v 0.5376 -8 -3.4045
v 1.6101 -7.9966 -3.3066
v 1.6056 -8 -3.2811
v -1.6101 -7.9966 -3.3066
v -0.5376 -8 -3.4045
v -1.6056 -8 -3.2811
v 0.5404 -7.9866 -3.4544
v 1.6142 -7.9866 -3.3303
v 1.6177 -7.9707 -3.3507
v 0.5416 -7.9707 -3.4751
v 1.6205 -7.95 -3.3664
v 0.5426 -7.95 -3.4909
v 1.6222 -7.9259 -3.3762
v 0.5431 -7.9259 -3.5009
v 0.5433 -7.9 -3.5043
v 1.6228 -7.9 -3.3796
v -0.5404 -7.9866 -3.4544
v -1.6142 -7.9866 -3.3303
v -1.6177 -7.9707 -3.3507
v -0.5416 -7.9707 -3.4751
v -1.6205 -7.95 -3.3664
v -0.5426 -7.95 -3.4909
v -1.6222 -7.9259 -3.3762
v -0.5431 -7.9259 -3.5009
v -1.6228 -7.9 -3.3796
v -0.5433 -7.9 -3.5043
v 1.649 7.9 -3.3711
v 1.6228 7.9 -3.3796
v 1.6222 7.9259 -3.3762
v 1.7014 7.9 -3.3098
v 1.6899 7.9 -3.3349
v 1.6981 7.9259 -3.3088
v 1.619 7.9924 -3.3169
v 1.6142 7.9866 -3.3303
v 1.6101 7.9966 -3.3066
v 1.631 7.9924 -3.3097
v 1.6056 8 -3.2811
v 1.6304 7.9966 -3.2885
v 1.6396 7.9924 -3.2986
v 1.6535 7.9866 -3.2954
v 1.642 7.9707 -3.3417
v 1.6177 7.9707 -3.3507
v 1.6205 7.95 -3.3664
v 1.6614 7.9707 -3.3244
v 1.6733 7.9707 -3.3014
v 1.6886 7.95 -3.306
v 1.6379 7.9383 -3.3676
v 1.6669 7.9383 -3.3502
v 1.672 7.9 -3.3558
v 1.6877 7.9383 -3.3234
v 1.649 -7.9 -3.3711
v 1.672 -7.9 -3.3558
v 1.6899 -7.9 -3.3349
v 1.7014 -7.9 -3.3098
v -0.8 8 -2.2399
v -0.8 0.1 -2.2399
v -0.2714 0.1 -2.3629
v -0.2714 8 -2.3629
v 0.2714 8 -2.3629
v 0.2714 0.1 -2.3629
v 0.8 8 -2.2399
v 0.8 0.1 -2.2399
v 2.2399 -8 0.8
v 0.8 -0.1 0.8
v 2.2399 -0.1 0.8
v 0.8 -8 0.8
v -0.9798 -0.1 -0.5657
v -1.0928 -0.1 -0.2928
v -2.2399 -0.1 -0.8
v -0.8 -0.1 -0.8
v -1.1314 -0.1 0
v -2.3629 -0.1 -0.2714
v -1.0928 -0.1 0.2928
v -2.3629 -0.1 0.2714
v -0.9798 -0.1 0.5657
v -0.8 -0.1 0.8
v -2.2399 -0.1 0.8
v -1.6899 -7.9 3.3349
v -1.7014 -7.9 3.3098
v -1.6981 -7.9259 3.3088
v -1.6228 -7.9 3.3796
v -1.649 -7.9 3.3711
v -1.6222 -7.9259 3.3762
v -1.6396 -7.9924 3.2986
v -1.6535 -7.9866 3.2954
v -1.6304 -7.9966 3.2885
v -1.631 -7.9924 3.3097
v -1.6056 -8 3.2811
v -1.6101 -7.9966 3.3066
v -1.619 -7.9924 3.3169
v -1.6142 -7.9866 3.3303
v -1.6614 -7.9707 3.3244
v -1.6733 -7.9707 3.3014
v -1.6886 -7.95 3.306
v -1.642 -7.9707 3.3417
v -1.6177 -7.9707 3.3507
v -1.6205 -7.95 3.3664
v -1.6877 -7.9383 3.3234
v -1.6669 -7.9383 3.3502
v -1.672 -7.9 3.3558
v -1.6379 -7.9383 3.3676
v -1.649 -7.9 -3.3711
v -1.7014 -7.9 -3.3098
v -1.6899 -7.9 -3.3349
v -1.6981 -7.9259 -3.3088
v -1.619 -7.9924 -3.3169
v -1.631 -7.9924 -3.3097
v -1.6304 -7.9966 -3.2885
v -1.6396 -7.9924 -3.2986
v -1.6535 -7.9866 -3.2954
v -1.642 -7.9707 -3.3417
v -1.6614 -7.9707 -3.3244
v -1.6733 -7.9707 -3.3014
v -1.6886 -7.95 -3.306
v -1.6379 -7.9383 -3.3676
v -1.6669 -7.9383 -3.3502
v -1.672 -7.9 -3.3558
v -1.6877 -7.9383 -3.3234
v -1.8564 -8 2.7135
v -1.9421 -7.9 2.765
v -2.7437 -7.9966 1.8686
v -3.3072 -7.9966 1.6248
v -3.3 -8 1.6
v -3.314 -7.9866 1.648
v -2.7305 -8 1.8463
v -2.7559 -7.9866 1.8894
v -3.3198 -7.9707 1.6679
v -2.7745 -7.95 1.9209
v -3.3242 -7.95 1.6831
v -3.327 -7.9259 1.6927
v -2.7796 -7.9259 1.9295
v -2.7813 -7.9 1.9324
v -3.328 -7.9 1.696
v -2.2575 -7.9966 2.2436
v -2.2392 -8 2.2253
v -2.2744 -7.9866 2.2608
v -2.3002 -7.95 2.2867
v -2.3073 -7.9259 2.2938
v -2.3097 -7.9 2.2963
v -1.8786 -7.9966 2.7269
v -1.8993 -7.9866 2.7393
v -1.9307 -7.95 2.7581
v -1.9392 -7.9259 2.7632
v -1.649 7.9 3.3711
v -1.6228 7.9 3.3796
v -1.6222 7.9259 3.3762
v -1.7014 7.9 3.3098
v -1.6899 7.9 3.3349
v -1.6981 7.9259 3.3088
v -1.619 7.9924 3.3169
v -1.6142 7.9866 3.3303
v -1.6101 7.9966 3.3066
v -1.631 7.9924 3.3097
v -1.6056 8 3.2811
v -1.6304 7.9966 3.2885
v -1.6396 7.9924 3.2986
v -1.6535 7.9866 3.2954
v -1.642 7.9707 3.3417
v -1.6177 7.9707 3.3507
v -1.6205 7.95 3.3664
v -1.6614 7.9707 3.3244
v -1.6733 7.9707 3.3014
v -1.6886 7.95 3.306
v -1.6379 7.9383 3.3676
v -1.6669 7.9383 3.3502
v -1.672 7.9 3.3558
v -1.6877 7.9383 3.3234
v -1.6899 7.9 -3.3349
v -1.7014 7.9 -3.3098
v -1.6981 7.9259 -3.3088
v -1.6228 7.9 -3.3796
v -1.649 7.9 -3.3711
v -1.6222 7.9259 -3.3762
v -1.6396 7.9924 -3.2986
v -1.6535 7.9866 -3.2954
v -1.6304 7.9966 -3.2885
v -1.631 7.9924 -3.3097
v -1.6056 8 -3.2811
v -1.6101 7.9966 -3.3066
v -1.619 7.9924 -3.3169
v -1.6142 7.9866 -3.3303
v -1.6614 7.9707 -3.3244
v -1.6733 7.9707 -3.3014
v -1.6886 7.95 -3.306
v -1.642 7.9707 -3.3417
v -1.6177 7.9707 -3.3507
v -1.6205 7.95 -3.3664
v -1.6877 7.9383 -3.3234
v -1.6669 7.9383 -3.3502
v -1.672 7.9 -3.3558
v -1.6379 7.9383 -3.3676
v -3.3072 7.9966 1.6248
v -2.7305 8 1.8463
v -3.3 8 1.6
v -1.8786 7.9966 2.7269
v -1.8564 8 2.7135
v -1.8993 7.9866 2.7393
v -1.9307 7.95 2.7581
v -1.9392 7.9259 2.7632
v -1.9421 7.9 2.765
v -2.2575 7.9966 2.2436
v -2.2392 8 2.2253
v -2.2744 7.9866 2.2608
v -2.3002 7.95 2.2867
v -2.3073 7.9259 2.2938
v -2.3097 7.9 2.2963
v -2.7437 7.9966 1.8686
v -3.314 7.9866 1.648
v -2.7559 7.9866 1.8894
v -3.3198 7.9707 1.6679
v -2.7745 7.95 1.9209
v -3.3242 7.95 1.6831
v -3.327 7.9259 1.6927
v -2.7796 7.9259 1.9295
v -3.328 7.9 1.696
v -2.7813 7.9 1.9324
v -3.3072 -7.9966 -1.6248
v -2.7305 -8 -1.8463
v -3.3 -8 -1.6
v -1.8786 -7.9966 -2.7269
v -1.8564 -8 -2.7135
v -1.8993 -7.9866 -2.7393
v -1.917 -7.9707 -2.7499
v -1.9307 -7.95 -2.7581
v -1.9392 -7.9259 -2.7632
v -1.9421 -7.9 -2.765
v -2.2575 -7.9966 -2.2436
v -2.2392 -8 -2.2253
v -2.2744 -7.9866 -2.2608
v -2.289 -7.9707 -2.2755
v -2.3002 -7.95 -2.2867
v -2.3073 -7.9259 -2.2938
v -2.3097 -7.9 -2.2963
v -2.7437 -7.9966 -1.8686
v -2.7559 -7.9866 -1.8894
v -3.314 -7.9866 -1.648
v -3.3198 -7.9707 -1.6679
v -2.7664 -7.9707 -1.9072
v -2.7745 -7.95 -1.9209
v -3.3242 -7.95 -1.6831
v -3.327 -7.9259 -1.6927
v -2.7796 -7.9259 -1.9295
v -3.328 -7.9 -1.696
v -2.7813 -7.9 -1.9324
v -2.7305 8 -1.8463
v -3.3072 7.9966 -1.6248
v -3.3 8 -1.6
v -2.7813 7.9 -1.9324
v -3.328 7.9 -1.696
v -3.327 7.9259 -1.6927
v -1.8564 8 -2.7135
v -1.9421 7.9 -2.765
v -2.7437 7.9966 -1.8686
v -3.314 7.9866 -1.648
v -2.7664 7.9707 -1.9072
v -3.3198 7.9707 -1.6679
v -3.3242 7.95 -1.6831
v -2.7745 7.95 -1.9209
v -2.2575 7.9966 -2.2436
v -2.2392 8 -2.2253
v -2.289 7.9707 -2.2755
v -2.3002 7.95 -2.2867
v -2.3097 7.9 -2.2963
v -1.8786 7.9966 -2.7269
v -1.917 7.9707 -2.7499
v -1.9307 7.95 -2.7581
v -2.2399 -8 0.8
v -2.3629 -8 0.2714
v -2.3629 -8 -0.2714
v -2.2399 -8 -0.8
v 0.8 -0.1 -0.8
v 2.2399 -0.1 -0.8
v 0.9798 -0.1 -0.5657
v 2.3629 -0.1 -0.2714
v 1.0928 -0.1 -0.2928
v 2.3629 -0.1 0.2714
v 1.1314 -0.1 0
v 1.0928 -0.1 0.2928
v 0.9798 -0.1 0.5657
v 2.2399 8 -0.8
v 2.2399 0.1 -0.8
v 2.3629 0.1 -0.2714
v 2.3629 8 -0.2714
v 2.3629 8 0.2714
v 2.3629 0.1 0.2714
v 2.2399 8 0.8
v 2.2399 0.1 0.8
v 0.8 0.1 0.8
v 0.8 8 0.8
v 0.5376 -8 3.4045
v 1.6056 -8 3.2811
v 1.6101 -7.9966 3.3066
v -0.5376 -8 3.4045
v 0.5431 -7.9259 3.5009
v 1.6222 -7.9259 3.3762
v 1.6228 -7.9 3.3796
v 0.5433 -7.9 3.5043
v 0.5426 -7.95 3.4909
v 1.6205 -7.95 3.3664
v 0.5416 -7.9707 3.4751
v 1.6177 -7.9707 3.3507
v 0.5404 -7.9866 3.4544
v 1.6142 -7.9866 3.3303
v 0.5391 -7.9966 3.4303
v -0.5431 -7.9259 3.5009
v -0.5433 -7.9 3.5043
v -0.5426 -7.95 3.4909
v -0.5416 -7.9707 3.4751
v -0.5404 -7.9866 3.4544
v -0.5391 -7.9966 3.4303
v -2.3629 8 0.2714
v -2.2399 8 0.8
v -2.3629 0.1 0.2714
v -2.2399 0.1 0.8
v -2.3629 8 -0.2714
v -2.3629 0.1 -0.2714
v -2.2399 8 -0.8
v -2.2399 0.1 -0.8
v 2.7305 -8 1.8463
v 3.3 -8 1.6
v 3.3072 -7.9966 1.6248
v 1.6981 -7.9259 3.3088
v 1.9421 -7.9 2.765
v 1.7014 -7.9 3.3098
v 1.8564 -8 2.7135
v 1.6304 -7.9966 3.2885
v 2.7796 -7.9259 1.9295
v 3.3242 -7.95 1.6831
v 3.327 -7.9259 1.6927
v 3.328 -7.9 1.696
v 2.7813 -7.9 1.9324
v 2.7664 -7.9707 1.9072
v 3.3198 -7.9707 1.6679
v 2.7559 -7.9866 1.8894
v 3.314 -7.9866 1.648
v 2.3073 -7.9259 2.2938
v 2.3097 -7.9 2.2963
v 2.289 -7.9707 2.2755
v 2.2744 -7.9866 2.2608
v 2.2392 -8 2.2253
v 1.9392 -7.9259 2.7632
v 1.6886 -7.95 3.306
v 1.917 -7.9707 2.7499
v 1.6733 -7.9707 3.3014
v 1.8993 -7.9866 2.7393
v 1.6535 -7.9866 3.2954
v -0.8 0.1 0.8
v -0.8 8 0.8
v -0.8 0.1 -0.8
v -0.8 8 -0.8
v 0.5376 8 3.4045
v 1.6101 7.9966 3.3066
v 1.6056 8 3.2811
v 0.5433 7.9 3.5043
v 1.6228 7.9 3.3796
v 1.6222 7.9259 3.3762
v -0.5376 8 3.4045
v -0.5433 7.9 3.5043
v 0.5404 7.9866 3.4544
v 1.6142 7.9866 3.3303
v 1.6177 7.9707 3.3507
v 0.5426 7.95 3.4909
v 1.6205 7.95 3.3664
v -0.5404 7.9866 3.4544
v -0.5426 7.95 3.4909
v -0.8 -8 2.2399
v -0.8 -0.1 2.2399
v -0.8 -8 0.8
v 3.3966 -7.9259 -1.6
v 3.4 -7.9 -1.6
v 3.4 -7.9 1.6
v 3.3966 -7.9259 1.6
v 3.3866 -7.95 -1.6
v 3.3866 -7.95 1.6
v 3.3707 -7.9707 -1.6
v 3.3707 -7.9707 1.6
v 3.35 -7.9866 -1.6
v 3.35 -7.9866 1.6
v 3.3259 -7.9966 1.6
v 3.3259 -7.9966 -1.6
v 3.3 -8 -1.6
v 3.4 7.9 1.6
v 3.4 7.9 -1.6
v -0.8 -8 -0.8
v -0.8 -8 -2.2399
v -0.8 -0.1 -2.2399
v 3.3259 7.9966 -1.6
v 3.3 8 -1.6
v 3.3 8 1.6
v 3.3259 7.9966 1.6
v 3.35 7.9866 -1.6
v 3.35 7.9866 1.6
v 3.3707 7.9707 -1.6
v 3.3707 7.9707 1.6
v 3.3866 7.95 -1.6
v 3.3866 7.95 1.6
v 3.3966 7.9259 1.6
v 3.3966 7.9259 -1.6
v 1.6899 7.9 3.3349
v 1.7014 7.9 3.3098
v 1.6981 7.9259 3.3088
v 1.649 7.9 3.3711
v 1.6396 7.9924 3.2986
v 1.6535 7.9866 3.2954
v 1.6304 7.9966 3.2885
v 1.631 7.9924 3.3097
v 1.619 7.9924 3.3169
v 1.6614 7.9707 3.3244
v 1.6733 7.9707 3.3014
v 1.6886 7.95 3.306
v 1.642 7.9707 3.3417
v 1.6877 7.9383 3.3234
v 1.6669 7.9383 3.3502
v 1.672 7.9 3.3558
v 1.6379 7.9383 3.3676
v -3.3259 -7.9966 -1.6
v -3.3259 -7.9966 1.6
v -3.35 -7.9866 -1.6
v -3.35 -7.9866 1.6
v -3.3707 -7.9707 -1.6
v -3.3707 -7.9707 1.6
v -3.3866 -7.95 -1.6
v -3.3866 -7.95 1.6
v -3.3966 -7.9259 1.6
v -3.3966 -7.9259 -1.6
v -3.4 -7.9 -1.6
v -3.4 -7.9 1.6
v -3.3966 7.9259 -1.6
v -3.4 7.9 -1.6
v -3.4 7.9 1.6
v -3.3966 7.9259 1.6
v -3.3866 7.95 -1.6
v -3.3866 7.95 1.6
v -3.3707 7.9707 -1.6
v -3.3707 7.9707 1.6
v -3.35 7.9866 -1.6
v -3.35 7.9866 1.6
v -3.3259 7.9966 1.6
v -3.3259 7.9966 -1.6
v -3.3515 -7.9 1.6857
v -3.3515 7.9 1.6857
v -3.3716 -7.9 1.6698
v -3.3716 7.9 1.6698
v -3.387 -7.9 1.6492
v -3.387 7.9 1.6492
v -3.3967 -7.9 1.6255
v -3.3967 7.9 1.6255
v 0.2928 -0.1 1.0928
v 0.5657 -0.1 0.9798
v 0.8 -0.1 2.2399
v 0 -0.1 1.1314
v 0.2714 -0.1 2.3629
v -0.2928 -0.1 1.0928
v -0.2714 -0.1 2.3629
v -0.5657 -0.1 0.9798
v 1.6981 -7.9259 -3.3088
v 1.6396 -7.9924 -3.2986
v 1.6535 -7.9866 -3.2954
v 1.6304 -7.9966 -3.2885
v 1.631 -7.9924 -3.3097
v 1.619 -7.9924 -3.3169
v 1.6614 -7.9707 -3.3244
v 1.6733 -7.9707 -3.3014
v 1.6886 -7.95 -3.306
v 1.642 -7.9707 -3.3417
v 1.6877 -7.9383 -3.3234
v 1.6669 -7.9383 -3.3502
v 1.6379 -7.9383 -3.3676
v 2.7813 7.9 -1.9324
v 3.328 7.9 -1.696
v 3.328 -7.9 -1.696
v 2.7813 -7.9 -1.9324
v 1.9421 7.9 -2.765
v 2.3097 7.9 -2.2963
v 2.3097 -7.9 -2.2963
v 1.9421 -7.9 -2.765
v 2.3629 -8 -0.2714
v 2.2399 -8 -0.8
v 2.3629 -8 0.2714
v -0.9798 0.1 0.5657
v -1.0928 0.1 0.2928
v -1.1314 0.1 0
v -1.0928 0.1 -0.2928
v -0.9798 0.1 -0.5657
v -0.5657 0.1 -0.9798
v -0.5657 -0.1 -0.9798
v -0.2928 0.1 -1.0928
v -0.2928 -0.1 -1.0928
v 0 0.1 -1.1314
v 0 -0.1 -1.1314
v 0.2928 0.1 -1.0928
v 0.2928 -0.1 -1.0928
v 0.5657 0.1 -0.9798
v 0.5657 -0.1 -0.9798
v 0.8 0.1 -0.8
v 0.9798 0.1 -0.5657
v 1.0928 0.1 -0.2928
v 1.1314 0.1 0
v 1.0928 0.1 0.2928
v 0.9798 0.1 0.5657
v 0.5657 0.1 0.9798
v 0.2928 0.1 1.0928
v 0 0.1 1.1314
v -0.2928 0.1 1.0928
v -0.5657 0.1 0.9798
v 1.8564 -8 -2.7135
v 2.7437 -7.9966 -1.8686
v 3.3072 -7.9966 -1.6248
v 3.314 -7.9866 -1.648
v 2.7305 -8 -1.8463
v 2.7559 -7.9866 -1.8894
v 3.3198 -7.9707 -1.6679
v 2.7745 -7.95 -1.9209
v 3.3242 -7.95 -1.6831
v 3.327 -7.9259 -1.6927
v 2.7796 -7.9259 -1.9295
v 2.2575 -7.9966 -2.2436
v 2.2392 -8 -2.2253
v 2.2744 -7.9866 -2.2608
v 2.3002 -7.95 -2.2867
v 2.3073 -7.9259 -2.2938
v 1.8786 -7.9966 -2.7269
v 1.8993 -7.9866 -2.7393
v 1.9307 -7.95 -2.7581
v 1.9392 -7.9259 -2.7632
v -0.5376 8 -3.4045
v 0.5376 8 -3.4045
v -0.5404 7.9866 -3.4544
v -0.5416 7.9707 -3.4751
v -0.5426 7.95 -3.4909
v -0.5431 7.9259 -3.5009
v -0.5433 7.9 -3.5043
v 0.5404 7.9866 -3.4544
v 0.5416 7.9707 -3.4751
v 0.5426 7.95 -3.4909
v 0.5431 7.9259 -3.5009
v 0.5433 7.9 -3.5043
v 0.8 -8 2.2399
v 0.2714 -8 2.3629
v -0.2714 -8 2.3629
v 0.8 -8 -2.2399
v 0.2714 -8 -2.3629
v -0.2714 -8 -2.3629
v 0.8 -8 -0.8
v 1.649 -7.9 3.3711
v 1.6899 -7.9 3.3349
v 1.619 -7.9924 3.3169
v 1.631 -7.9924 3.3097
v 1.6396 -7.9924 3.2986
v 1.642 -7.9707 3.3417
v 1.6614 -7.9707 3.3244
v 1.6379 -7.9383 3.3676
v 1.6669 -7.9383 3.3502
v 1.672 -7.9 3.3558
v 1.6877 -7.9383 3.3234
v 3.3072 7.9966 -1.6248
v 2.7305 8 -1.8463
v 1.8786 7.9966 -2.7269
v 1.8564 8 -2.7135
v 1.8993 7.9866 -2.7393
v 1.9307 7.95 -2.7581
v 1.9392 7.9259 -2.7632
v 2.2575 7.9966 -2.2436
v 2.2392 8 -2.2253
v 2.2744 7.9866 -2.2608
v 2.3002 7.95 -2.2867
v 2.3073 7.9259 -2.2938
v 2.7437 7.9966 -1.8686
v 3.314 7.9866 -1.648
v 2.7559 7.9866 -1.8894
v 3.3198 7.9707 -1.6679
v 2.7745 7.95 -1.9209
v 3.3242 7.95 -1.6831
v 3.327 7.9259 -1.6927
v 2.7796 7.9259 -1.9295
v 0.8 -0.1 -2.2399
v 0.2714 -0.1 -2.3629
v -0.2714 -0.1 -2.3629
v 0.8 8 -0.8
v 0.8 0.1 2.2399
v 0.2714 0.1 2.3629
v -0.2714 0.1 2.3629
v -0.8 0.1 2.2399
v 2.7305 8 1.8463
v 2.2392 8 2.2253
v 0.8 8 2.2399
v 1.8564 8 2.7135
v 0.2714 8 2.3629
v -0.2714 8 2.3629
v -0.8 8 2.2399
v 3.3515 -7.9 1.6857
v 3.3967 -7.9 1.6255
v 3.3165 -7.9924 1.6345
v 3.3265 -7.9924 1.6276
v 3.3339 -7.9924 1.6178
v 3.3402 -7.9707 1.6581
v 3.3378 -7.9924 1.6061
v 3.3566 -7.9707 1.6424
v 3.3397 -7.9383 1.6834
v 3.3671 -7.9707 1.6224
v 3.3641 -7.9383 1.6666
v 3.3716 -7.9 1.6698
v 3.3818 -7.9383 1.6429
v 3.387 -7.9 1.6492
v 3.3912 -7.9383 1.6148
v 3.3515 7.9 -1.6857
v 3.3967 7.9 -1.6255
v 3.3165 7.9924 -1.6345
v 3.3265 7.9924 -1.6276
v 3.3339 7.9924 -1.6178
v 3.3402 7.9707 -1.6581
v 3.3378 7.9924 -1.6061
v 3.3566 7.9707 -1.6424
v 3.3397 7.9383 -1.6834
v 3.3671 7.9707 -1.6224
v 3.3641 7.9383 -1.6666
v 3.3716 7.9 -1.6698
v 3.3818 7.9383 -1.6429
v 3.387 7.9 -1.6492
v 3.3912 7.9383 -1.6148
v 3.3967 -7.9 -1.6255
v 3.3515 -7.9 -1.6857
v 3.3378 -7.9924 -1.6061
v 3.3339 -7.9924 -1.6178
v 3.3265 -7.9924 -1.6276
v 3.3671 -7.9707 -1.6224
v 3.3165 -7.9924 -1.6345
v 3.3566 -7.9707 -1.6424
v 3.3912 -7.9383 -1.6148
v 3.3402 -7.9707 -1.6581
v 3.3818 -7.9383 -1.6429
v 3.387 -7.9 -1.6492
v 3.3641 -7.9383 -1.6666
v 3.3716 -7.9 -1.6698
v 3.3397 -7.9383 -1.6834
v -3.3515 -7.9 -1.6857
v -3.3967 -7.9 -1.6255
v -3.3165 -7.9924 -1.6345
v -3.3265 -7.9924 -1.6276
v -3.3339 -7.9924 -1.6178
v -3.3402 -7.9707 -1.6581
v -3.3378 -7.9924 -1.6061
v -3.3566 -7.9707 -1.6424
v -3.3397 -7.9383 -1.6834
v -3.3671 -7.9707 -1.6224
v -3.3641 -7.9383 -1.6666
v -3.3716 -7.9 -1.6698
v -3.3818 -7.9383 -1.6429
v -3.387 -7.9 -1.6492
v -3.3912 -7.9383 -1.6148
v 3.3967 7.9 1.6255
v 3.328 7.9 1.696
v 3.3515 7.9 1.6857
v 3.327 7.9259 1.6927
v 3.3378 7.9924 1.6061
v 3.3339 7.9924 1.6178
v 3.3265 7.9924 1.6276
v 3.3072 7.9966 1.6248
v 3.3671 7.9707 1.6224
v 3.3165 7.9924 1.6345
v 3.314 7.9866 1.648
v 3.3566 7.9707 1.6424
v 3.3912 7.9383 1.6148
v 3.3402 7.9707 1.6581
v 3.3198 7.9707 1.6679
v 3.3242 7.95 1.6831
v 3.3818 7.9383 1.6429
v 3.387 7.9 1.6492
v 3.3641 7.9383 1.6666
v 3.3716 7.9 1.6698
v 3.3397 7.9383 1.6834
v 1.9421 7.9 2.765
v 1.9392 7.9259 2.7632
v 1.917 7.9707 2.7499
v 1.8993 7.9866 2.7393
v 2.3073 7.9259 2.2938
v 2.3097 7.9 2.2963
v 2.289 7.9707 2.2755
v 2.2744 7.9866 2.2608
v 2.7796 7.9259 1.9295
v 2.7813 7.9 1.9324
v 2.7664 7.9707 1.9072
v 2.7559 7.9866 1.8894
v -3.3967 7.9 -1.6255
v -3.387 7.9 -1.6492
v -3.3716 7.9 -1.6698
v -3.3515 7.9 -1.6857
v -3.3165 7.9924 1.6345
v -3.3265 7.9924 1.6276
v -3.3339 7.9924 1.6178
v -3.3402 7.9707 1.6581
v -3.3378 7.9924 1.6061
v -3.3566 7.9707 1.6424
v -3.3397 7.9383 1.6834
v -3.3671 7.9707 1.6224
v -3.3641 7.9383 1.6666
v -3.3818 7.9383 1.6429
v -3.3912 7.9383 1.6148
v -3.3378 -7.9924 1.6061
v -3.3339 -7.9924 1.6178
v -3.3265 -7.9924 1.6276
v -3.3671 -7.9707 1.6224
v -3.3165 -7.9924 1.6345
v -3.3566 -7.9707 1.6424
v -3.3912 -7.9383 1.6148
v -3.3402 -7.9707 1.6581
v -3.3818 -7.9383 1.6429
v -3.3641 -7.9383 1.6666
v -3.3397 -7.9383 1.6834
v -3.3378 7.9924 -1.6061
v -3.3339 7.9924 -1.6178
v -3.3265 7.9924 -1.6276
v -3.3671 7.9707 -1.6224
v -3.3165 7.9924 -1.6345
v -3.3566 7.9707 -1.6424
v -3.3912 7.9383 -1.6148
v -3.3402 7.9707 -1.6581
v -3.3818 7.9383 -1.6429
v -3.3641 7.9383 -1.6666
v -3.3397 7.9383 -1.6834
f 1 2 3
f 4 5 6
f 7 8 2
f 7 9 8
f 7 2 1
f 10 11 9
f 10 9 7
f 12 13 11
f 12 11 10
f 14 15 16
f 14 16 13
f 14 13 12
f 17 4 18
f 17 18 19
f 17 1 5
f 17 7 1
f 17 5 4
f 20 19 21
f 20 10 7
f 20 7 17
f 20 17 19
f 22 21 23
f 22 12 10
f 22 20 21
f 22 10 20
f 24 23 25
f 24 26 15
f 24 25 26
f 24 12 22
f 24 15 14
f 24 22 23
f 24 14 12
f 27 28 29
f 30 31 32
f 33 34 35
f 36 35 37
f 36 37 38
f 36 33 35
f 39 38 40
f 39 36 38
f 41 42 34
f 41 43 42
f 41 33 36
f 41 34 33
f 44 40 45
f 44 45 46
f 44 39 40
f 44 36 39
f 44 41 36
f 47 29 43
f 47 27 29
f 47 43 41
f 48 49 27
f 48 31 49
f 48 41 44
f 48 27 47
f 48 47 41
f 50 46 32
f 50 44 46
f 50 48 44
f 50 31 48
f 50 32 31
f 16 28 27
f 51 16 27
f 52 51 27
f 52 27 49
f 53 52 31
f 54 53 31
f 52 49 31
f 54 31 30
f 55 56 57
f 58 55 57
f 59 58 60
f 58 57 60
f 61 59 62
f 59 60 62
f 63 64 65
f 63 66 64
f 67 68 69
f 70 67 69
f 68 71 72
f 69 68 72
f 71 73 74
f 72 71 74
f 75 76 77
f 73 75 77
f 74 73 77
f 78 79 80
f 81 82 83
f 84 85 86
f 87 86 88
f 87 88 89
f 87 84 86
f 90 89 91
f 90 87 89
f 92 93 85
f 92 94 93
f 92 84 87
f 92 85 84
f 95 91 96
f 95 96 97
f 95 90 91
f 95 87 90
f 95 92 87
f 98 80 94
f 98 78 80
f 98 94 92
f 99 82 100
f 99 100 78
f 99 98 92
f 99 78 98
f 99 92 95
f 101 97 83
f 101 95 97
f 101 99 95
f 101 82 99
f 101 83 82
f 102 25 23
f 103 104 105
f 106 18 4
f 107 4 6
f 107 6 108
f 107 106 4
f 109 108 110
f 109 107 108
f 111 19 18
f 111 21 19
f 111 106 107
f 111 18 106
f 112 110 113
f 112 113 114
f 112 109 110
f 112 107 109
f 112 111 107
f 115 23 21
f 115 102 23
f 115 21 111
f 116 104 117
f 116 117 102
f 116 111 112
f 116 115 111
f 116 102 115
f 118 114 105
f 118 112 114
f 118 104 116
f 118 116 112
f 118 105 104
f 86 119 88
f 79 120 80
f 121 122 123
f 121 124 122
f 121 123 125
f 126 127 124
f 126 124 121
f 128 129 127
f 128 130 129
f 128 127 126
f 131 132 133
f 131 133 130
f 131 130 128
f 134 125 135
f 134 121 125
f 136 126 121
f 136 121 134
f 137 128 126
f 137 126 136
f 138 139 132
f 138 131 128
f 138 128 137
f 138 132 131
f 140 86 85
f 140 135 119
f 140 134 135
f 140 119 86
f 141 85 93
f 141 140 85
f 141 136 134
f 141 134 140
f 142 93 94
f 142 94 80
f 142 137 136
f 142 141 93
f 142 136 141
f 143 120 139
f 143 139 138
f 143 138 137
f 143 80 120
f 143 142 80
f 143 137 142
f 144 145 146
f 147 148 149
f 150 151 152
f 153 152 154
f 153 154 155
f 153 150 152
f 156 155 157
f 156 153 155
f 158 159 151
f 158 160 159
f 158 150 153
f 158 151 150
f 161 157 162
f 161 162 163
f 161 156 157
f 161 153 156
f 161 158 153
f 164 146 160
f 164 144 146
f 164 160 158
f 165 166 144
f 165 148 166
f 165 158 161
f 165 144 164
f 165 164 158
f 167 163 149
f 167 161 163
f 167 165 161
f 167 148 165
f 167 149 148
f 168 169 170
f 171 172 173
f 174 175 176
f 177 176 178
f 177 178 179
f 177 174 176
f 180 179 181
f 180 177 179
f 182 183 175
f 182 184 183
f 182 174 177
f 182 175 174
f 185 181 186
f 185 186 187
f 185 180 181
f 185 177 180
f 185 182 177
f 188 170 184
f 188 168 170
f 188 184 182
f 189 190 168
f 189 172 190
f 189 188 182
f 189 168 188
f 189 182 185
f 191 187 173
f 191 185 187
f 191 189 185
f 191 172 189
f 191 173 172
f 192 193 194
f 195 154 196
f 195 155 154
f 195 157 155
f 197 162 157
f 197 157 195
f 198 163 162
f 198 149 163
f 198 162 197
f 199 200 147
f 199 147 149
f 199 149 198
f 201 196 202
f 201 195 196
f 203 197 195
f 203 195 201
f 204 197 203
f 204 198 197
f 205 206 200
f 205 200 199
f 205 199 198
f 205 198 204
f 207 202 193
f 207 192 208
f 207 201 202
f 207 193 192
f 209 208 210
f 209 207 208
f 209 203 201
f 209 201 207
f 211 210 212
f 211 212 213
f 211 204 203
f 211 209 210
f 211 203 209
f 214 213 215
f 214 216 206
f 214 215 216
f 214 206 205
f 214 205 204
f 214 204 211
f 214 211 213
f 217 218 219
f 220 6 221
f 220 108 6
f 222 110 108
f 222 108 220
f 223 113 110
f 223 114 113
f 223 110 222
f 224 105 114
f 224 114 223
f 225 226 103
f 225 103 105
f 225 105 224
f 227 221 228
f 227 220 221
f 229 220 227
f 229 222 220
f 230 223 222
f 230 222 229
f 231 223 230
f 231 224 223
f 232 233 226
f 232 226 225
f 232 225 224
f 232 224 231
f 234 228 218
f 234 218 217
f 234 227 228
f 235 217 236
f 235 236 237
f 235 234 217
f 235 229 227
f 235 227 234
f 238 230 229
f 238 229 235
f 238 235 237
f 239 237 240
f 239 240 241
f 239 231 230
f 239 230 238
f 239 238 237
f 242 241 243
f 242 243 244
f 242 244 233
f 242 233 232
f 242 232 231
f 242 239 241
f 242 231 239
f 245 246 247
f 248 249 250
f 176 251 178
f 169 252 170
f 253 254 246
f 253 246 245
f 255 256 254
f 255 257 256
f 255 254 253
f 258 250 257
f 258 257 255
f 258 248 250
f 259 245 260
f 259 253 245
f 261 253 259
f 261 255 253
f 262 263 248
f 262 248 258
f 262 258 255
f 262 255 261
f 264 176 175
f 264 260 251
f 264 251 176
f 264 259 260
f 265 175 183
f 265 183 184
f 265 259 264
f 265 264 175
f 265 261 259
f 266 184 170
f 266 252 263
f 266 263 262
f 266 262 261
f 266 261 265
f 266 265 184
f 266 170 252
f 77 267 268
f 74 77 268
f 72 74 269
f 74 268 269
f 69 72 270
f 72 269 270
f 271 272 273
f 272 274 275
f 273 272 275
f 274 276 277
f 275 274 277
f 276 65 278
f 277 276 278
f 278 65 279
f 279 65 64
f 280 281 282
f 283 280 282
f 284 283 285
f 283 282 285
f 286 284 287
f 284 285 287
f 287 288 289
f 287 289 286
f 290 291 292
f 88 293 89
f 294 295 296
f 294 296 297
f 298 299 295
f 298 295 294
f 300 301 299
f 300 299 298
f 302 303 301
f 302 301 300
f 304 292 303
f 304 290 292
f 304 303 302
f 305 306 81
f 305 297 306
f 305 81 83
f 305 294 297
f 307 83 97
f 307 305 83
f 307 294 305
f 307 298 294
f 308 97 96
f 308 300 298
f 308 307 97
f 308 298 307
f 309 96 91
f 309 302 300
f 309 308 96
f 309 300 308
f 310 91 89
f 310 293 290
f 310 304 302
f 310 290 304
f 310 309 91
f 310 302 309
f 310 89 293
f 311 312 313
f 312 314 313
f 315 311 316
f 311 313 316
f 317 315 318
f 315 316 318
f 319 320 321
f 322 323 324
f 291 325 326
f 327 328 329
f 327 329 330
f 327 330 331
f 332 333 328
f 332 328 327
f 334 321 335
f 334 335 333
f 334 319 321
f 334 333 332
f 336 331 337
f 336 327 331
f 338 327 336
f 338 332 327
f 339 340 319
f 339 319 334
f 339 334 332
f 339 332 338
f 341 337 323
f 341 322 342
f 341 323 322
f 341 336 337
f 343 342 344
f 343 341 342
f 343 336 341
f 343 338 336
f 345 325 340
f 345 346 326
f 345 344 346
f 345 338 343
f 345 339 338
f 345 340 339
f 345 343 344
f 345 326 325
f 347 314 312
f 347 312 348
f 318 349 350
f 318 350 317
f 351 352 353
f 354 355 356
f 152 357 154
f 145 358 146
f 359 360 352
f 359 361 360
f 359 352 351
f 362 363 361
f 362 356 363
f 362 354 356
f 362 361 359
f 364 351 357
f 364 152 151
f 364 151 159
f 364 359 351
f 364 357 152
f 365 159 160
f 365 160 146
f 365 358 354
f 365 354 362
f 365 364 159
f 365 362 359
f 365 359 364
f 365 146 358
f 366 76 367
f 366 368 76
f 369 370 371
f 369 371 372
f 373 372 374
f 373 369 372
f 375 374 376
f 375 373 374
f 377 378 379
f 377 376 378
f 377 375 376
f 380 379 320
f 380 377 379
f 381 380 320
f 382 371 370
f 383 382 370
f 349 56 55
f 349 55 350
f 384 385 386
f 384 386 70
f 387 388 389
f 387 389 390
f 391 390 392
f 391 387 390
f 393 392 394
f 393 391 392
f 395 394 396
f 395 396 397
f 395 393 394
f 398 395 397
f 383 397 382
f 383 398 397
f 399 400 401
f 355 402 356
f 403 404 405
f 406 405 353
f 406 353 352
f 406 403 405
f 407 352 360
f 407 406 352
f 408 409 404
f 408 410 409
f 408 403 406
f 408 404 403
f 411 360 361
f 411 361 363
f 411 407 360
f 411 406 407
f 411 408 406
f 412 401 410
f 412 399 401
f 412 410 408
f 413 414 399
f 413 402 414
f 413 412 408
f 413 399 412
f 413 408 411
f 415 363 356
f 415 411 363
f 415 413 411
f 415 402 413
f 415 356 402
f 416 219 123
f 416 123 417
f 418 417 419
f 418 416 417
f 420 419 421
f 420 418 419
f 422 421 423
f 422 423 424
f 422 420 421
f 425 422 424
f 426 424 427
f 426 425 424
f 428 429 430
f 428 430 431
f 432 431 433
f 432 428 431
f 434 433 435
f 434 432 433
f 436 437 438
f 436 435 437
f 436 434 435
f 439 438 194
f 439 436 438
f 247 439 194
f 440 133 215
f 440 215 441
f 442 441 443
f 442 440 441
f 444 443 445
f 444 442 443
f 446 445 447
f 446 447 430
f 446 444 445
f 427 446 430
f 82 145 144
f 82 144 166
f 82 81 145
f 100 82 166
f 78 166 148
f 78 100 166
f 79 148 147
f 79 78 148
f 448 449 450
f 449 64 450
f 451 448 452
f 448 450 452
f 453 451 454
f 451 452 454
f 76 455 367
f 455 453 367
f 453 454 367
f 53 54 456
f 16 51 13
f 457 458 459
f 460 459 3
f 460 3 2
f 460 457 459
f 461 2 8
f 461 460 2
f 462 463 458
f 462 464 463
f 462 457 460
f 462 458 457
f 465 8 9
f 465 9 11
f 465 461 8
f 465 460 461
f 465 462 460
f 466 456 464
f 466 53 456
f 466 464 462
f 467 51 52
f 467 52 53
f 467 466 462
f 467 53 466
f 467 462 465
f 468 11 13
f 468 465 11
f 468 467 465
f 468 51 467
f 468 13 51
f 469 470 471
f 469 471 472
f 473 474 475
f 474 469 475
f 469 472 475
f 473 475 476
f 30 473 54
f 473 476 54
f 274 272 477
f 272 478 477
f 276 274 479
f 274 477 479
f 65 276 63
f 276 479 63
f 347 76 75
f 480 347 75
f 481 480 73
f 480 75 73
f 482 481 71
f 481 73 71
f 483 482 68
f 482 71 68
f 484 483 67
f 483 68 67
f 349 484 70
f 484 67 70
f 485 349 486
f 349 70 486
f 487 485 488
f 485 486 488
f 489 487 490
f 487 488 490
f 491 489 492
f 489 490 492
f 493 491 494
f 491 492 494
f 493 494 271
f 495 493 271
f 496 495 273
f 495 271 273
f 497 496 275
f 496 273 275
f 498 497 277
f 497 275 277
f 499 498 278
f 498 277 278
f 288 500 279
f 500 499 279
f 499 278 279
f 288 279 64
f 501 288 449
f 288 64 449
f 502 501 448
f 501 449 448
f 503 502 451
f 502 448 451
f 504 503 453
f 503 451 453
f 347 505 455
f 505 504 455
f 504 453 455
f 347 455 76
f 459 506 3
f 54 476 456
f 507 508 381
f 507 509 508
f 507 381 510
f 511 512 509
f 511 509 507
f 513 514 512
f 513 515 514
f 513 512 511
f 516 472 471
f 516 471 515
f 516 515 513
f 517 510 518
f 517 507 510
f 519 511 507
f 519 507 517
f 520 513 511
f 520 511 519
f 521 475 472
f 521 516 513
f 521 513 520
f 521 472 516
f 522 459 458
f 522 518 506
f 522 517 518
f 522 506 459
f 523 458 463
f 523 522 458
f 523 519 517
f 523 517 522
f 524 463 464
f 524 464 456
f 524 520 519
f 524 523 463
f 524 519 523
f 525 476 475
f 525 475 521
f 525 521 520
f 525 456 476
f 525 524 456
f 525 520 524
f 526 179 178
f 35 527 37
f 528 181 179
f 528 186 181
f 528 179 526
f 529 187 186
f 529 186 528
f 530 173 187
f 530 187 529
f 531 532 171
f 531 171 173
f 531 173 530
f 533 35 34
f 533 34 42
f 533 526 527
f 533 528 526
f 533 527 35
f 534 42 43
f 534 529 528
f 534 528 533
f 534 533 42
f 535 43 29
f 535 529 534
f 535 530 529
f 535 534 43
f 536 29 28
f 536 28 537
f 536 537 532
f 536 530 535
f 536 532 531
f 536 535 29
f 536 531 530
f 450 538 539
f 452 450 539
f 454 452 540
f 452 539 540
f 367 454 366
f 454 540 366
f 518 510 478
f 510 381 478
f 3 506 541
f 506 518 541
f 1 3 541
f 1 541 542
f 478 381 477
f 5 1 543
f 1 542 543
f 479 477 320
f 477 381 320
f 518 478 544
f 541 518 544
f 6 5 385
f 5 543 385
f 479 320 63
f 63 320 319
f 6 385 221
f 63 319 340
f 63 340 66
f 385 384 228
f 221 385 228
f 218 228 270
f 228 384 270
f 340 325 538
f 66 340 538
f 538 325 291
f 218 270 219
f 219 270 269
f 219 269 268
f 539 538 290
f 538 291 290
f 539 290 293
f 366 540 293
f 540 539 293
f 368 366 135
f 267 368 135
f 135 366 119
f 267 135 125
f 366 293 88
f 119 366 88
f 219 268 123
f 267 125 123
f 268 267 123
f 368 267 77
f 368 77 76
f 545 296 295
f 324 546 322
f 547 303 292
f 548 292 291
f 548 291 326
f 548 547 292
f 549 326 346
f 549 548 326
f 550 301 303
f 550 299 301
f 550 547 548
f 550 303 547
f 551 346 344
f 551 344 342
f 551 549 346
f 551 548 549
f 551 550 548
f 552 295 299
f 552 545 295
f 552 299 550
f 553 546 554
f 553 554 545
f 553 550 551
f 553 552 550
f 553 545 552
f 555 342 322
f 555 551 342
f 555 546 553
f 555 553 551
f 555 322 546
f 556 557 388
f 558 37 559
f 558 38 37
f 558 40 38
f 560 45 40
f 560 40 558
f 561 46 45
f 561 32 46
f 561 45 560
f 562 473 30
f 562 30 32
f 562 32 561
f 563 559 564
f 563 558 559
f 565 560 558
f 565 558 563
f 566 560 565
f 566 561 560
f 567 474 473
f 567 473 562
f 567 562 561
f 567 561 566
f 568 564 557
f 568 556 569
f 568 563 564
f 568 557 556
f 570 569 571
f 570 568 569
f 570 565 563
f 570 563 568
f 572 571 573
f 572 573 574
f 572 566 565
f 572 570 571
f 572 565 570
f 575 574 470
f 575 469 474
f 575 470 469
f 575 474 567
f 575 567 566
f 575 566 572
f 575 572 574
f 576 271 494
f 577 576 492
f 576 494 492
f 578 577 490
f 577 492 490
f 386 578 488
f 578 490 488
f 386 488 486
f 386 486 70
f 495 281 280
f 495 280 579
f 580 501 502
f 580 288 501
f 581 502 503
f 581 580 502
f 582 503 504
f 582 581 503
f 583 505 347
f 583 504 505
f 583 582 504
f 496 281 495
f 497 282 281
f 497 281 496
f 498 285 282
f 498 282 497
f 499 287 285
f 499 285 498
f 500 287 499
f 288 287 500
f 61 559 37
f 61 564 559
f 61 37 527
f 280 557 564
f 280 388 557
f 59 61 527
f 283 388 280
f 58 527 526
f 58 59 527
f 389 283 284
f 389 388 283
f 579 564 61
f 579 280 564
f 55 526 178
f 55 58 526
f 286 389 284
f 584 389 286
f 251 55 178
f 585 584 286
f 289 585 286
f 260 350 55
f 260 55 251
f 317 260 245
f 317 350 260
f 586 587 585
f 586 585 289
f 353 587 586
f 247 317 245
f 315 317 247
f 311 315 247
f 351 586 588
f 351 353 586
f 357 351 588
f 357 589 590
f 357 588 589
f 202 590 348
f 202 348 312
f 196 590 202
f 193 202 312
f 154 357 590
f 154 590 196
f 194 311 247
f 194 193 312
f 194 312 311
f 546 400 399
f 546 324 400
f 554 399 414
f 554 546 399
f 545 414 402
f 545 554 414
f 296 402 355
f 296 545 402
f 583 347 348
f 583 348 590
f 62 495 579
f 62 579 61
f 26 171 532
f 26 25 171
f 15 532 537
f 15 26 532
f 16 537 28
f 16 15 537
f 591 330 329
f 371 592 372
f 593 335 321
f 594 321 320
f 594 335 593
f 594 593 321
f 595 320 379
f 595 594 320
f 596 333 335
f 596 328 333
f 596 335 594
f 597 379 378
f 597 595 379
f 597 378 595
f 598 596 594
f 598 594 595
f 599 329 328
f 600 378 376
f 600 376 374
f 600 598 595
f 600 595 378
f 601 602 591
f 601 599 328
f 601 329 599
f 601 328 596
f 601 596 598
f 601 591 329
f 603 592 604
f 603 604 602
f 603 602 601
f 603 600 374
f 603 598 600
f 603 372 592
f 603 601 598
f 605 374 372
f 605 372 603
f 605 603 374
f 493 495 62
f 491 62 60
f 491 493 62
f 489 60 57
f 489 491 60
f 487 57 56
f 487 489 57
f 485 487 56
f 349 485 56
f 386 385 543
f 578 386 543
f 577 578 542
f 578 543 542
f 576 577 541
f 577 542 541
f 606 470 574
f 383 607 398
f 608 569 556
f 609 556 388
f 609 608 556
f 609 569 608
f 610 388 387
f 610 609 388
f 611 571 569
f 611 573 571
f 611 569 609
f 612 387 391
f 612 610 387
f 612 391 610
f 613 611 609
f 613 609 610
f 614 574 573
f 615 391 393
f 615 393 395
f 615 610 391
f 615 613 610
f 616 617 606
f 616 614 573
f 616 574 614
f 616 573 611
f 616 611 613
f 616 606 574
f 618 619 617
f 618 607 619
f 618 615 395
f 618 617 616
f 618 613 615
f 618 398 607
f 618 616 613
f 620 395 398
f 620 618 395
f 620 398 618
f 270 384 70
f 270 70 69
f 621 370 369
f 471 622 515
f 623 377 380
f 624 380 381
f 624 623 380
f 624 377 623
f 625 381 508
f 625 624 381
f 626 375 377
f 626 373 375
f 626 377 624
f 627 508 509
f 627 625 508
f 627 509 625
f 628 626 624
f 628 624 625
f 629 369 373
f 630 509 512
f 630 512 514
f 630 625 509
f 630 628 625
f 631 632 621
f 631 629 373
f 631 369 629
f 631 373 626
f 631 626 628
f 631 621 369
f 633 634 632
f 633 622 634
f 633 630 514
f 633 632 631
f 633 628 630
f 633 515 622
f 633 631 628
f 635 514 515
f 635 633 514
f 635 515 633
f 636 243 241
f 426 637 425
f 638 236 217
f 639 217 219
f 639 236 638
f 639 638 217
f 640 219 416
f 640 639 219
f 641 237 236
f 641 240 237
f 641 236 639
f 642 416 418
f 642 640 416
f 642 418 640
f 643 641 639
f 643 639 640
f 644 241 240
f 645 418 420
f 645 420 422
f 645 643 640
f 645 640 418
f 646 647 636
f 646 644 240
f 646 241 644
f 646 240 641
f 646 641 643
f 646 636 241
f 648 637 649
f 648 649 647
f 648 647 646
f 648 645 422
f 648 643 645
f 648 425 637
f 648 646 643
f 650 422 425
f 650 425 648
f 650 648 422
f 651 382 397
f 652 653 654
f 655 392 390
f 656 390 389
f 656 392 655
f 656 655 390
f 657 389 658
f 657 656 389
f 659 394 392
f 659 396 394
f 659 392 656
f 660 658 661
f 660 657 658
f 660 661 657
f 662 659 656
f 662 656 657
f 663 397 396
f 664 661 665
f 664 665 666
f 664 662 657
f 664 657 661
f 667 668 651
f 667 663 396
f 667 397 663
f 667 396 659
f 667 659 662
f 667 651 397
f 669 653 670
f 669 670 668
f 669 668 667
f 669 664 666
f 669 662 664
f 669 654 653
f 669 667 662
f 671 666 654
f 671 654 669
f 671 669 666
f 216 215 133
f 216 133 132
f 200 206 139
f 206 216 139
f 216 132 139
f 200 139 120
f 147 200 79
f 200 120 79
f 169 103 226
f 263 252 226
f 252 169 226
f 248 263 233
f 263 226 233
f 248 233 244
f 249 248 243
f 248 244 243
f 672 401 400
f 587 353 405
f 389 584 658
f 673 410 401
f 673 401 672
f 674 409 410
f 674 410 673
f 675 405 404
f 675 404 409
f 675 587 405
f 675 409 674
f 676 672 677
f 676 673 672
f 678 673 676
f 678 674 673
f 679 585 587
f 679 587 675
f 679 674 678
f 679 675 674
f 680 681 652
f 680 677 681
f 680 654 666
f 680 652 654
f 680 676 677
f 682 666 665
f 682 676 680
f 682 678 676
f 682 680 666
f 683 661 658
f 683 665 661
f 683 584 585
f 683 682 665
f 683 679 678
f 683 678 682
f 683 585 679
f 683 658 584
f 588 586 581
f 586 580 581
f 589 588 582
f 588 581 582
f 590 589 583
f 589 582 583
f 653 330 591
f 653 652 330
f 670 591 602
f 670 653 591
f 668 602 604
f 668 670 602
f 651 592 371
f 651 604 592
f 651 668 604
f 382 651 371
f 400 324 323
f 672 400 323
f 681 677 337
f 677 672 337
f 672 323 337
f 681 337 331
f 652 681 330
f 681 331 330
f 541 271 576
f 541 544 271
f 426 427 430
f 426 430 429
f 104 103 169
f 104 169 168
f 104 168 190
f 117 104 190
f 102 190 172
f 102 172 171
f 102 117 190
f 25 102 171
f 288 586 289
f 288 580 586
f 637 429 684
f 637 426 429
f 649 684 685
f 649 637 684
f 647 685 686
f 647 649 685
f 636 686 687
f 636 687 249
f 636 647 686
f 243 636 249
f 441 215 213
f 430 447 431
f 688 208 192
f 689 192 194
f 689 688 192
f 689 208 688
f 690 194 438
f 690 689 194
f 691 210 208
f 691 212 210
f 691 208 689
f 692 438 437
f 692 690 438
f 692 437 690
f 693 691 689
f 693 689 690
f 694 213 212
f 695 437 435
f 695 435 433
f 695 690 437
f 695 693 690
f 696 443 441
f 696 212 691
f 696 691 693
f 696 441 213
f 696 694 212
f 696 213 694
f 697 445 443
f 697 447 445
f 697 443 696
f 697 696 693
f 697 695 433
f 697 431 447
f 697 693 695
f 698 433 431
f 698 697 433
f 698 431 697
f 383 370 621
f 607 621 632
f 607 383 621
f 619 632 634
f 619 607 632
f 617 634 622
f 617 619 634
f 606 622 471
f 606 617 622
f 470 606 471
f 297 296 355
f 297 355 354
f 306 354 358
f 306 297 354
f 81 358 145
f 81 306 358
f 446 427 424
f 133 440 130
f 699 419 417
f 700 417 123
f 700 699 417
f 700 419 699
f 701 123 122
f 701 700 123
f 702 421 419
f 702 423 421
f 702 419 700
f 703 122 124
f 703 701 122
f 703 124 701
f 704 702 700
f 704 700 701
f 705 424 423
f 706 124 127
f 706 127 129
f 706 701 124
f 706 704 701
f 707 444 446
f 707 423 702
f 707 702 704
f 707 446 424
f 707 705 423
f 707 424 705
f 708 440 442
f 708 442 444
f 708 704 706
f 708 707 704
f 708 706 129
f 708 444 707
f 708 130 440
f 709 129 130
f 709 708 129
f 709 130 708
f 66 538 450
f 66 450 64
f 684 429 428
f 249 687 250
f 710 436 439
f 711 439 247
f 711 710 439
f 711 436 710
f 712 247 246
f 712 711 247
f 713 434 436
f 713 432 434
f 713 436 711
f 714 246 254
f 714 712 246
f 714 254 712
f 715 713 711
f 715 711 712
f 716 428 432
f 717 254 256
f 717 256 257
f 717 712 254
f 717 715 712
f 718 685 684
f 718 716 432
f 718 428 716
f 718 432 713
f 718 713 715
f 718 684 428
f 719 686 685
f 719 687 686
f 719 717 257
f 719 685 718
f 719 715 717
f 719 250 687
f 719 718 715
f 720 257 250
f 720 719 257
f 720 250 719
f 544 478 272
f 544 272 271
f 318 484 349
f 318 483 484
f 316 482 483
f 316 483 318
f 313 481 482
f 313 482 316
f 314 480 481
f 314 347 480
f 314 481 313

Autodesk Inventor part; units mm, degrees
ref_plane "YZ Plane" through (0, 0, 0) normal (1, 0, 0) x (0, 1, 0)
ref_plane "XZ Plane" through (0, 0, 0) normal (0, 1, 0) x (-1, 0, 0)
ref_plane "XY Plane" through (0, 0, 0) normal (0, 0, 1) x (1, 0, 0)
sketch "Sketch2" plane through (0, 0, 0) normal (0, 1, 0) x (-1, 0, 0)
  circle A0 centre (0, 0) radius 3.52 construction
  circle A1 centre (0, 0) radius 2.3784 construction
  line L0 (-4, 4) -> (4, 4) construction
  line L1 (4, 4) -> (4, -4) construction
  line L2 (-0.8, 2.2399) -> (-0.8, 0.8)
  line L3 (-0.8, 0.8) -> (-2.2399, 0.8)
  line L4 (-2.2399, -0.8) -> (-0.8, -0.8)
  line L5 (-0.8, -0.8) -> (-0.8, -2.2399)
  line L6 (0.8, -2.2399) -> (0.8, -0.8)
  line L7 (0.8, -0.8) -> (2.2399, -0.8)
  line L8 (2.2399, 0.8) -> (0.8, 0.8)
  line L9 (0.8, 0.8) -> (0.8, 2.2399)
  arc A2 (0.8, 2.2399) -> (-0.8, 2.2399) centre (0, 0) ccw
  arc A3 (-2.2399, 0.8) -> (-2.2399, -0.8) centre (0, 0) ccw
  arc A4 (-0.8, -2.2399) -> (0.8, -2.2399) centre (0, 0) ccw
  arc A5 (2.2399, -0.8) -> (2.2399, 0.8) centre (0, 0) ccw
  circle A6 centre (-4, 4) radius 2.4
  circle A7 centre (4, 4) radius 2.4
  circle A8 centre (-4, -4) radius 2.4
  circle A9 centre (4, -4) radius 2.4
  arc A10 (1.6845, 3.3686) -> (-1.6845, 3.3686) centre (0, -5.93) ccw
  line L10 (-3.4, 1.6762) -> (-3.4, -1.6762)
  line L11 (3.4, 1.6762) -> (3.4, -1.6762)
  arc A11 (-1.6845, -3.3686) -> (1.6845, -3.3686) centre (0, 5.93) ccw
  circle A12 centre (0, 0) radius 1.1314
  point P0 (0, 4)
  point P1 (4, 0)
  dimension "d0" = 4.7569
  dimension "d1" = 7.04
  dimension "d2" = 8
  dimension "d4" = 1.6
  dimension "d20" = 4.8
  dimension "d21" = 18.9
  dimension "d22" = 6.8
extrude "Extrusion1" add sketch "Sketch2" along normal mid plane 16 contours A6 A10 A7 L11 A9 A11 A8 L10
extrude "Extrusion3" add sketch "Sketch2" along normal mid plane 0.2 contours A2 L9 A12 L2 | A12 L4 A3 L3 | L8 A5 L7 A12 | A12 L6 A4 L5
fillet "Fillet1" radius 0.1 24 edges at (1.6845, 0, 3.3686) (3.4, 0, 1.6762) (-1.6845, 0, 3.3686) (-3.4, 0, 1.6762) (3.4, 0, -1.6762) (1.6845, 0, -3.3686) (-1.6845, 0, -3.3686) (-3.4, 0, -1.6762) (2.3145, 8, 2.2915) (0, 8, 3.52) (-2.3145, 8, 2.2915) (-3.4, 8, 0) (-2.3145, 8, -2.2915) (0, 8, -3.52) (2.3145, 8, -2.2915) (3.4, 8, 0) (3.4, -8, 0) (2.3145, -8, 2.2915) (0, -8, 3.52) (-2.3145, -8, 2.2915) (-3.4, -8, 0) (-2.3145, -8, -2.2915) (0, -8, -3.52) (2.3145, -8, -2.2915)
equation "\"d2\" = lu"
equation "\"d4\" = axlet"
equation "\"lu\" = 8"
equation "\"axlet\" = 1.6"
properties part number "6538c-White" material "ABS Plastic"
